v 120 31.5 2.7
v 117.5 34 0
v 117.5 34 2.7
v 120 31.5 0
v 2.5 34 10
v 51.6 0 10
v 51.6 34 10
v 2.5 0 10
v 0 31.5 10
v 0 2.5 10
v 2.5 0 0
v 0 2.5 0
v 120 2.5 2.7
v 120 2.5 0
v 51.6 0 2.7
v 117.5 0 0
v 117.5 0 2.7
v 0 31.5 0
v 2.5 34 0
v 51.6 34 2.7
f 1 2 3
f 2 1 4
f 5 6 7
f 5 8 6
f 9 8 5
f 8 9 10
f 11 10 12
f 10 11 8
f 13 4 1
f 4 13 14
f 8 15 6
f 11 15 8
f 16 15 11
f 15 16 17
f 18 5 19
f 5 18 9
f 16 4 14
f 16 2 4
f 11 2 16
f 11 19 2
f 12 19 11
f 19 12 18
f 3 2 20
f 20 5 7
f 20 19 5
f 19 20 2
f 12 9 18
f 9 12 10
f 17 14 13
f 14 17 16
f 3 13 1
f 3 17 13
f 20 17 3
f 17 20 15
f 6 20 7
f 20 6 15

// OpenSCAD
$fn = 32;

// ----------------------------------------------------------------------
// Stepped bar: endstep, 120 x 34 x 10/2.7 mm
// ----------------------------------------------------------------------

// --- parameters (mm) ---
bar_l = 120;              // bar length, X
bar_w = 34;               // bar width, Y
plate_t = 10;             // thickness of the thick zone, Z
thin_t = 2.7;             // thickness of the thin zone
corner_c = 2.5;           // corner chamfer of the bar
step_cut = 7.3;           // material removed from the thin zone
step_x = 51.6;            // step position from the left end
depth_1 = 7.3;            // depth of cut 1 from the top face

profile = [[2.5, 0], [117.5, 0], [120, 2.5], [120, 31.5], [117.5, 34], [2.5, 34], [0, 31.5], [0, 2.5]];  // primary outline, 8 points, counter clockwise
void_1 = [[51.6, -1], [121, -1], [121, 35], [51.6, 35]];  // thin zone beyond the step, 4 points

// --- the one profile operation ---
difference() {
  linear_extrude(height = plate_t) polygon(points = profile);
  translate([0, 0, plate_t - depth_1])
    linear_extrude(height = depth_1 + 1) polygon(points = void_1);
}
